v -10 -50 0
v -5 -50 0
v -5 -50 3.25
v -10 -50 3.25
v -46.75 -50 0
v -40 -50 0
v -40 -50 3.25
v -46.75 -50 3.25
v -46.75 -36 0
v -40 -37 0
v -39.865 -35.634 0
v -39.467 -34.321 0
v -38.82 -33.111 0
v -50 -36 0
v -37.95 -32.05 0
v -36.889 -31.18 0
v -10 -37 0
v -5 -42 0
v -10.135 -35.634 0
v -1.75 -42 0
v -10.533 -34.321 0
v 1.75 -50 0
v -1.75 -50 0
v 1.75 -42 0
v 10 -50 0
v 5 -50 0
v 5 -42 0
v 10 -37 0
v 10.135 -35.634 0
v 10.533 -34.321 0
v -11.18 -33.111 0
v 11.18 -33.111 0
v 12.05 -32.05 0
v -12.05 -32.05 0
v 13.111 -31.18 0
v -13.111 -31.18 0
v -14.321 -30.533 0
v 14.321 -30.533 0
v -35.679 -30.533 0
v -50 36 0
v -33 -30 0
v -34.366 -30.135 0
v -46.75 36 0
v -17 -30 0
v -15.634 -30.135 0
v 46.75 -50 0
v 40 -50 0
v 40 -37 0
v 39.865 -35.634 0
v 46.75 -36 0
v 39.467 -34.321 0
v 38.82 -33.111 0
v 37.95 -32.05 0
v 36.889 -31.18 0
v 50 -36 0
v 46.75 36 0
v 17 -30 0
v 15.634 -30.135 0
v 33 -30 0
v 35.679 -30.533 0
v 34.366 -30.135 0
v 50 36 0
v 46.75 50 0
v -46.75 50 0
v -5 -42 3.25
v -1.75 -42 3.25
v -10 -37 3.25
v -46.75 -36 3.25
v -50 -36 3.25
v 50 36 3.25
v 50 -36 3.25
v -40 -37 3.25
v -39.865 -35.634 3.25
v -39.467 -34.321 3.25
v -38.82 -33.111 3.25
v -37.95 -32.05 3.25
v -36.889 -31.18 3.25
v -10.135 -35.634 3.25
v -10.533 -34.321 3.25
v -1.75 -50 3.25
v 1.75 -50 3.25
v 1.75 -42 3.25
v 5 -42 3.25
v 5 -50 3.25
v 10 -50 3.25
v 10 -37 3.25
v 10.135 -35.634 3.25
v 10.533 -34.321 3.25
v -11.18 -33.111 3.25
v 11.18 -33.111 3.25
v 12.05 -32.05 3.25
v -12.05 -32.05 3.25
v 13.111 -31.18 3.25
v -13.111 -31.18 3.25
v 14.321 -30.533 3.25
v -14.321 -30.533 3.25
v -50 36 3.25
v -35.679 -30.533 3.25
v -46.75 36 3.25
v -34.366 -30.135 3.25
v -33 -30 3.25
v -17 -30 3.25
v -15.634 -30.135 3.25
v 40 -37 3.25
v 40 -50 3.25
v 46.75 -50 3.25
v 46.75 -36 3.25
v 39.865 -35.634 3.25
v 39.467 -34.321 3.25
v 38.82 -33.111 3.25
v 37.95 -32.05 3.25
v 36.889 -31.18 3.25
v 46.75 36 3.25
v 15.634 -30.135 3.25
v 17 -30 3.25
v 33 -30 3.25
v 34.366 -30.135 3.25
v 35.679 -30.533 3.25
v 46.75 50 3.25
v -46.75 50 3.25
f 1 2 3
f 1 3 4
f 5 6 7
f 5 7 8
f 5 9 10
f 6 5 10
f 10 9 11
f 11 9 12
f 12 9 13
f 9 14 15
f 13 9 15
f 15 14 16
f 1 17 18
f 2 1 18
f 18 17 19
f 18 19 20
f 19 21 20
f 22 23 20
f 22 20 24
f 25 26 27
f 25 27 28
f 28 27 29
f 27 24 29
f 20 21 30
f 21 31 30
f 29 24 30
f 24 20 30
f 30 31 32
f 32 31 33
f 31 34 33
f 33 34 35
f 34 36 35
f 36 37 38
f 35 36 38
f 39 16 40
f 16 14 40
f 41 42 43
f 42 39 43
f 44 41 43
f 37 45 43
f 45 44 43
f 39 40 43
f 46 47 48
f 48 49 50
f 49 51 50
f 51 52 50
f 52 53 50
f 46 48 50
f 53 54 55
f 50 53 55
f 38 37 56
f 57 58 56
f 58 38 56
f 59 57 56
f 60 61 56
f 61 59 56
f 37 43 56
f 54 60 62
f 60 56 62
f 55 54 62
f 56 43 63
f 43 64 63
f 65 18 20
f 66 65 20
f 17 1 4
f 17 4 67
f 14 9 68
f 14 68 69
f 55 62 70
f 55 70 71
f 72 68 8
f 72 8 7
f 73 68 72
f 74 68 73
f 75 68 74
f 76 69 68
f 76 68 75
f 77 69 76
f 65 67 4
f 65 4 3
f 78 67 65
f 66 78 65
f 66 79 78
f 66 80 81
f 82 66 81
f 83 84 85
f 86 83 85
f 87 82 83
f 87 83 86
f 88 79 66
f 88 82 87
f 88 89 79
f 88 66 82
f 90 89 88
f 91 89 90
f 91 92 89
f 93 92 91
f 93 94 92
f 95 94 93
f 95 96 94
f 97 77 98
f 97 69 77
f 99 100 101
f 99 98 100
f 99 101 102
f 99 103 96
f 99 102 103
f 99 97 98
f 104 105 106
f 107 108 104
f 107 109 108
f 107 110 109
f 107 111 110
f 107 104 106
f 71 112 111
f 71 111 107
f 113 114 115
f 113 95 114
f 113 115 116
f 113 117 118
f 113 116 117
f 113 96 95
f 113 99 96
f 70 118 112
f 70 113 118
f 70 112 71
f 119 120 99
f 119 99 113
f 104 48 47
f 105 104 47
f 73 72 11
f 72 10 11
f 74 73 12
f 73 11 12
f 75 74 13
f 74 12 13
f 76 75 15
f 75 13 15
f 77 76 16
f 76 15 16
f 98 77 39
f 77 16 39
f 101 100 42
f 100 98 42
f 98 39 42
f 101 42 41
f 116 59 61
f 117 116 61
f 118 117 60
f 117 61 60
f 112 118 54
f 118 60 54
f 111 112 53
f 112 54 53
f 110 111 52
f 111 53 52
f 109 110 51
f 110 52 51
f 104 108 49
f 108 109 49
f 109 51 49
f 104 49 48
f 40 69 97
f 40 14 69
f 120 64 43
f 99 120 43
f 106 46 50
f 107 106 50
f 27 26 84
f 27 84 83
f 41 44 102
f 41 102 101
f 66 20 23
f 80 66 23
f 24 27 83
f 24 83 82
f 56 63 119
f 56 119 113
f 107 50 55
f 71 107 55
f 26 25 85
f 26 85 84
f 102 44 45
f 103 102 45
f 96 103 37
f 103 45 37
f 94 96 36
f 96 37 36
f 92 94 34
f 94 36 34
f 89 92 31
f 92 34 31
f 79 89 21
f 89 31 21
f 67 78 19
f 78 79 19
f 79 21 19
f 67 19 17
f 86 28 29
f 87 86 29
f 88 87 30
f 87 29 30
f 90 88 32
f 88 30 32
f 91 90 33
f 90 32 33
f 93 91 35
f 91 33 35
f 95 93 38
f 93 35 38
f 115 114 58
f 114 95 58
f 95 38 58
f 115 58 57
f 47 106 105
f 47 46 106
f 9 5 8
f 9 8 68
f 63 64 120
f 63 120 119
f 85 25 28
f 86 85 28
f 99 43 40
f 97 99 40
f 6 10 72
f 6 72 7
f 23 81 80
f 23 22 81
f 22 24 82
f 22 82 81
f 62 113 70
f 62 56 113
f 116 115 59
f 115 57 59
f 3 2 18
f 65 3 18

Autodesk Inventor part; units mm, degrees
ref_plane "YZ Plane" through (0, 0, 0) normal (1, 0, 0) x (0, 1, 0)
ref_plane "XZ Plane" through (0, 0, 0) normal (0, 1, 0) x (-1, 0, 0)
ref_plane "XY Plane" through (0, 0, 0) normal (0, 0, 1) x (1, 0, 0)
sketch "Sketch1" plane through (0, 0, 0) normal (0, 0, 1) x (1, 0, 0)
  line L0 (-50, 50) -> (50, 50)
  line L1 (50, 50) -> (50, -50)
  line L2 (50, -50) -> (-50, -50)
  line L3 (-50, -50) -> (-50, 50)
  line L4 (-92.7646, -8.503) -> (-89.7646, -8.503)
  line L5 (-89.7646, -8.503) -> (-89.7646, -11.753)
  line L6 (-89.7646, -11.753) -> (-92.7646, -11.753)
  line L7 (-92.7646, -11.753) -> (-92.7646, -8.503)
  line L8 (-92.7646, -21.6527) -> (-89.7646, -21.6527)
  line L9 (-89.7646, -21.6527) -> (-89.7646, -21.7527)
  line L10 (-89.7646, -21.7527) -> (-92.7646, -21.7527)
  line L11 (-92.7646, -21.7527) -> (-92.7646, -21.6527)
  line L12 (-50, 50) -> (-46.75, 50)
  line L13 (-46.75, 50) -> (-46.75, 36)
  line L14 (-46.75, 36) -> (-50, 36)
  line L15 (-50, 36) -> (-50, 50)
  line L16 (0, 50) -> (0, -50) construction
  line L17 (-50, 0) -> (50, 0) construction
  line L18 (50, 50) -> (46.75, 50)
  line L19 (46.75, 50) -> (46.75, 36)
  line L20 (46.75, 36) -> (50, 36)
  line L21 (50, 36) -> (50, 50)
  line L22 (-50, -50) -> (-46.75, -50)
  line L23 (-46.75, -50) -> (-46.75, -36)
  line L24 (-46.75, -36) -> (-50, -36)
  line L25 (-50, -36) -> (-50, -50)
  line L26 (46.75, -50) -> (46.75, -36)
  line L27 (46.75, -36) -> (50, -36)
  line L28 (50, -36) -> (50, -50)
  line L29 (50, -50) -> (46.75, -50)
  line L30 (-40, -50) -> (-10, -50)
  line L31 (-10, -50) -> (-10, -37)
  line L32 (-17, -30) -> (-33, -30)
  line L33 (-40, -37) -> (-40, -50)
  line L34 (40, -50) -> (10, -50)
  line L35 (10, -50) -> (10, -37)
  line L36 (17, -30) -> (33, -30)
  line L37 (40, -37) -> (40, -50)
  line L38 (-1.75, -50) -> (-5, -50)
  line L39 (-5, -50) -> (-5, -42)
  line L40 (-5, -42) -> (-1.75, -42)
  line L41 (-1.75, -42) -> (-1.75, -50)
  line L42 (1.75, -50) -> (5, -50)
  line L43 (5, -50) -> (5, -42)
  line L44 (5, -42) -> (1.75, -42)
  line L45 (1.75, -42) -> (1.75, -50)
  arc A0 (-33, -30) -> (-40, -37) centre (-33, -37) ccw
  arc A1 (-10, -37) -> (-17, -30) centre (-17, -37) ccw
  arc A2 (17, -30) -> (10, -37) centre (17, -37) ccw
  arc A3 (40, -37) -> (33, -30) centre (33, -37) ccw
  point P0 (0, 0)
  point P1 (-10, -30)
  point P2 (-40, -30)
  point P3 (10, -30)
  point P4 (40, -30)
  dimension "d0" = 100
  dimension "d2" = 100
  dimension "d3" = 3
  dimension "mat" = 3.25
  dimension "d5" = 3
  dimension "kerf" = 0.1
  dimension "d7" = 3.25
  dimension "d8" = 14
  dimension "d15" = 30
  dimension "d16" = 20
  dimension "d17" = 10
  dimension "d20" = 3.25
  dimension "d21" = 8
  dimension "d22" = 5
  dimension "d25" = 45
  dimension "d26" = 7
extrude "Extrusion2" add sketch "Sketch1" along normal blind 3.25 contours L0 L19 L20 L1 L27 L26 L2 L37 A3 L36 A2 L35 L43 L44 L45 L41 L40 L39 L31 A1 L32 A0 L33 L23 L24 L3 L14 L13 | L39 L40 L41 L2 | L45 L44 L43 L2
extrude "Extrusion3" cut sketch "Sketch1" along normal blind 3.25 contours L39 L40 L41 L2 | L45 L44 L43 L2
equation "\"d7\" = mat"
equation "\"d20\" = mat"
equation "\"d18\" = mat"
equation "\"d23\" = mat"
properties part number "body-back"
